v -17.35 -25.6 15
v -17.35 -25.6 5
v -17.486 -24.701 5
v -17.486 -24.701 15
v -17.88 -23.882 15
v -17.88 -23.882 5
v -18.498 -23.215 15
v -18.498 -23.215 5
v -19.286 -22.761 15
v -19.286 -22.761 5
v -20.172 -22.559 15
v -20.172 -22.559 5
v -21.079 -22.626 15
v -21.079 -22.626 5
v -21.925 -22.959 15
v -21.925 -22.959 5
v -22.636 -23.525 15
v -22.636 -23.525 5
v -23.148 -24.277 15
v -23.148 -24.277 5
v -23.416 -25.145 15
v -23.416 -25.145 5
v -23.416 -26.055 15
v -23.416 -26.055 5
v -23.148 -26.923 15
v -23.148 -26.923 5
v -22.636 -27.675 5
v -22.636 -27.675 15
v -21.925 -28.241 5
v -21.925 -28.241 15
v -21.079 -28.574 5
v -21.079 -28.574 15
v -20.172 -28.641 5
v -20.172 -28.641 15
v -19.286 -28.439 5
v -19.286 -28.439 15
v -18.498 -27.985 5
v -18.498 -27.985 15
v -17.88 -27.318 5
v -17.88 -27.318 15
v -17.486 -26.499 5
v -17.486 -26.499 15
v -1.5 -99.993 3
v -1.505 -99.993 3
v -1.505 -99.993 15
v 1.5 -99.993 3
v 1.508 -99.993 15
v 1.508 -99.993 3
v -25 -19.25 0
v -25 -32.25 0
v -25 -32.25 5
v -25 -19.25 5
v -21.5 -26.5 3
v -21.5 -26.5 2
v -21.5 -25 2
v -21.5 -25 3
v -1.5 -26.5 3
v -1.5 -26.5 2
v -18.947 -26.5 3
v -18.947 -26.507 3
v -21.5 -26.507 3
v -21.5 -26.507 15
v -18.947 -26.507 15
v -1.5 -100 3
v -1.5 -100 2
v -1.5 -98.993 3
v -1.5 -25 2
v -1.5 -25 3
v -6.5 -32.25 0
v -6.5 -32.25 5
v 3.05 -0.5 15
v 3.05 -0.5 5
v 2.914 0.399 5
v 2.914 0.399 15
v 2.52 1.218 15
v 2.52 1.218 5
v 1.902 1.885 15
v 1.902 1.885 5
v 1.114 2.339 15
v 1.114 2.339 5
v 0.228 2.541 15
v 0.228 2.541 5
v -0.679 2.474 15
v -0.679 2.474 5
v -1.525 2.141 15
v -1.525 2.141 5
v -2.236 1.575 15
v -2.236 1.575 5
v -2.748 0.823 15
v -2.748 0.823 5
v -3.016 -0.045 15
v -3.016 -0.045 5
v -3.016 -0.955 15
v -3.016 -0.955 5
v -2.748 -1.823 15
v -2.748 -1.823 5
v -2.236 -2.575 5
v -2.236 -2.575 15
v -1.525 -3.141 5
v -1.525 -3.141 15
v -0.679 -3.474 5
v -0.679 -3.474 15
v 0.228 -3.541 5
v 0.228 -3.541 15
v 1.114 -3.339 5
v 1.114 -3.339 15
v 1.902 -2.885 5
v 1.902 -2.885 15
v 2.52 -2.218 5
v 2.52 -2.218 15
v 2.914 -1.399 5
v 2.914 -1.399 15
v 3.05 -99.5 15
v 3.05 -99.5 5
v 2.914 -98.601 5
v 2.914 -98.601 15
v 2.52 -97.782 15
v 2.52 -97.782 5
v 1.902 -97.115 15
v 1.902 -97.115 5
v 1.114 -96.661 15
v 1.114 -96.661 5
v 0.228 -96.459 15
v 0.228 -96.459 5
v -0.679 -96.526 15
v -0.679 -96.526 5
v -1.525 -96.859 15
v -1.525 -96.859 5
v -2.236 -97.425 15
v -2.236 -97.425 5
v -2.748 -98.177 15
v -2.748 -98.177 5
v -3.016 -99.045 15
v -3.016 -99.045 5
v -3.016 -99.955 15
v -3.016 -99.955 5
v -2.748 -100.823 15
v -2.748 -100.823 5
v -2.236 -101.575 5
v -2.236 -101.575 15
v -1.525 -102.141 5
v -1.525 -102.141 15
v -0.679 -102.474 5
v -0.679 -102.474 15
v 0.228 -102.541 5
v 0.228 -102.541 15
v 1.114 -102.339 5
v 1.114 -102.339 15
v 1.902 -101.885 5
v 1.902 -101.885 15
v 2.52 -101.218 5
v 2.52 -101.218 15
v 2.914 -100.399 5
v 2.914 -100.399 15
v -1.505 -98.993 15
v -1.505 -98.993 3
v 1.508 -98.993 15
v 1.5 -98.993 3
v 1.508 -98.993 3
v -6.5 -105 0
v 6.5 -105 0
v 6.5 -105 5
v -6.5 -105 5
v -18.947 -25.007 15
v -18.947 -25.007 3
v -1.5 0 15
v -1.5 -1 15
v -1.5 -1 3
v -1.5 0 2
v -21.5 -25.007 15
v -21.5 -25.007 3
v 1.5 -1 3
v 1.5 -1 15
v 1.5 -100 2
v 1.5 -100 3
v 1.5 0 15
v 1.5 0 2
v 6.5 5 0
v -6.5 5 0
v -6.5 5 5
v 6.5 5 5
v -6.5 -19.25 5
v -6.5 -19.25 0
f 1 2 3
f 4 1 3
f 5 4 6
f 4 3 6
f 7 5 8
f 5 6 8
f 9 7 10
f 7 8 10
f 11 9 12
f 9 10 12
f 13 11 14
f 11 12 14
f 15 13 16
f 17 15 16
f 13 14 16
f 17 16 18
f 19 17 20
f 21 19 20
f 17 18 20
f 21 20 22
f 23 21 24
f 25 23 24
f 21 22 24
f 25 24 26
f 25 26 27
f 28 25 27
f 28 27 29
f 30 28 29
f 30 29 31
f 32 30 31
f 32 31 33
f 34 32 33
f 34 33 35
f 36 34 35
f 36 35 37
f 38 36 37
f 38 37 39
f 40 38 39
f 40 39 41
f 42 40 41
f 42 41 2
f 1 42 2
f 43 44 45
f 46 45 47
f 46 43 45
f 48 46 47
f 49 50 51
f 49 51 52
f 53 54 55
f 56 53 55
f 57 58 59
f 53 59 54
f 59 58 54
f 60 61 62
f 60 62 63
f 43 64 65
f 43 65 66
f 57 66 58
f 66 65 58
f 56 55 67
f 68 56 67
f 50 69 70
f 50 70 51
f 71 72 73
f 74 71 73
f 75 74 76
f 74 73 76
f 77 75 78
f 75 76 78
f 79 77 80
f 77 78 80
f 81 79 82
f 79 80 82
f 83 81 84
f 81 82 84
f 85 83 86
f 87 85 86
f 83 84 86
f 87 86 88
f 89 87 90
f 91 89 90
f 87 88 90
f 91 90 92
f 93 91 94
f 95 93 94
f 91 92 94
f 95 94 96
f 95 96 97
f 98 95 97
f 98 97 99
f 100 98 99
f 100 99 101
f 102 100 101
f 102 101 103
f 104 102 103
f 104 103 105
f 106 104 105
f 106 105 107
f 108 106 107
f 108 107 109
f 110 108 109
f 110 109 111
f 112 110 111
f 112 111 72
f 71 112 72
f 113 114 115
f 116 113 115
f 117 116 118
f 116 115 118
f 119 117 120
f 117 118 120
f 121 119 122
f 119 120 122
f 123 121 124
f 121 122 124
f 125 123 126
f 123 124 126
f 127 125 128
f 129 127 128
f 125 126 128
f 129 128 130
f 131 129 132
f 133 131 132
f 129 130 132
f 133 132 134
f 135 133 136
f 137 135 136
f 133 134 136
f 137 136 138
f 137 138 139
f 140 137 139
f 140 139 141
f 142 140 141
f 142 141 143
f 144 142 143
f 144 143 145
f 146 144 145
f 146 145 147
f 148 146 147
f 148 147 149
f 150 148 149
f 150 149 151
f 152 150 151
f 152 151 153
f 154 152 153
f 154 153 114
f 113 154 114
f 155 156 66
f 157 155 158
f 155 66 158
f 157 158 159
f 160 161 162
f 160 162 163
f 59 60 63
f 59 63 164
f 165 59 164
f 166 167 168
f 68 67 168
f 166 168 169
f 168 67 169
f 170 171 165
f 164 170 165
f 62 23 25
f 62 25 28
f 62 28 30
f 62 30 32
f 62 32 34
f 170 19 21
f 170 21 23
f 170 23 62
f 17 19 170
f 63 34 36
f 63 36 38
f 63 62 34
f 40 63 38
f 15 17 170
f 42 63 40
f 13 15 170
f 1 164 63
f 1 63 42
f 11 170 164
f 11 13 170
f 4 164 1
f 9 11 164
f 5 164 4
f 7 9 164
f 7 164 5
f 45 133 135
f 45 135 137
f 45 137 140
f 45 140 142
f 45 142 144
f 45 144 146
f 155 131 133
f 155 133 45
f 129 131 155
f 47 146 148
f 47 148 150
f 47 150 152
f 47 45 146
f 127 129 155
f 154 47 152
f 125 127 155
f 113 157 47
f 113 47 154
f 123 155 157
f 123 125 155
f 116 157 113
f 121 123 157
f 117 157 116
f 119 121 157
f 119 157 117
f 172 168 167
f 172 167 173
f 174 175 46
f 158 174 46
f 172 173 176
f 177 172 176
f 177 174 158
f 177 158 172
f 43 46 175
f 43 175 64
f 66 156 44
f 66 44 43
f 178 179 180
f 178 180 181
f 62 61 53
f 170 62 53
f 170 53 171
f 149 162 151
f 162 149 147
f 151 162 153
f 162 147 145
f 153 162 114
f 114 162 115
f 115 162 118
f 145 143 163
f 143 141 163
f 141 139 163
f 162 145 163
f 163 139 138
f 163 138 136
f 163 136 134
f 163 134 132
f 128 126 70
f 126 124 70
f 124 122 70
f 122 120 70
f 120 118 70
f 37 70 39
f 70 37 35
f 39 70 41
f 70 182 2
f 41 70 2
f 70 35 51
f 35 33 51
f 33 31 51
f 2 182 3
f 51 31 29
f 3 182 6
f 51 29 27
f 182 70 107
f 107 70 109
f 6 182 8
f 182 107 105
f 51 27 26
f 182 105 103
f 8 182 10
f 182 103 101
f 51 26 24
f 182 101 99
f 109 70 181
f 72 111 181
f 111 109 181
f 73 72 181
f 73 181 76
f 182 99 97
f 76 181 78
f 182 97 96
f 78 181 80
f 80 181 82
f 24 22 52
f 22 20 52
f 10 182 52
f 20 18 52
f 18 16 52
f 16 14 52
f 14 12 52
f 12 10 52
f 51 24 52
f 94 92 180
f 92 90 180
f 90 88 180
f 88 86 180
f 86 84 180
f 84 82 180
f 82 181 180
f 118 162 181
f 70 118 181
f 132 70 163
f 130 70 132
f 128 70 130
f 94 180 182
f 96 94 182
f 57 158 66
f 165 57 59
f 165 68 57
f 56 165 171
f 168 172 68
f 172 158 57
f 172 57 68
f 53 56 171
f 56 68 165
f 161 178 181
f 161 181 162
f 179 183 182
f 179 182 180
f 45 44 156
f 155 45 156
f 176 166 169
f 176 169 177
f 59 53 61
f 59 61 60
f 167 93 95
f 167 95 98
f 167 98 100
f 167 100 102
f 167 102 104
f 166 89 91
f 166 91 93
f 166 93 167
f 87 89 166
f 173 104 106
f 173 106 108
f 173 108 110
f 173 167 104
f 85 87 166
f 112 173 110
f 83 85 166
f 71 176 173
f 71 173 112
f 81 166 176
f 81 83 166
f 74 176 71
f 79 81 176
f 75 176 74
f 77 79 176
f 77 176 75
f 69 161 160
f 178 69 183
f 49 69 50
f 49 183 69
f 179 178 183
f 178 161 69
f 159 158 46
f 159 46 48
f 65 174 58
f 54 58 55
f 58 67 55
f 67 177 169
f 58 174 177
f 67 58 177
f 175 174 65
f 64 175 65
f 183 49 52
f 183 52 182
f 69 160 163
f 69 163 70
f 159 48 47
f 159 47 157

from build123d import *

# Parameters (mm, degrees)
PAD_DEPTH         = 1
SKETCH001_W       = 3
SKETCH001_H       = 1
SKETCH001_W_2     = 3.012331
SKETCH001_W_3     = 2.553459
SKETCH001_H_2     = 1.5
PAD001_DEPTH      = 20
CYLINDER_R        = 3.05
CYLINDER_DEPTH    = 15
CYLINDER002_R     = 3.05
CYLINDER002_DEPTH = 15
PAD002_DEPTH      = 5
CYLINDER001_R     = 3.05
CYLINDER001_DEPTH = 15


with BuildPart() as channels_with_connection:
    # Sketch → Pad (new body)
    with BuildSketch(Plane.XY.offset(2)):
        Polygon((-1.5, 0), (1.5, 0), (1.5, -100), (-1.5, -100), (-1.5, -26.5), (-21.5, -26.5), (-21.5, -25), (-1.5, -25), align=None)
    extrude(amount=PAD_DEPTH)

    # Sketch001 → Pad001 (new body)
    with BuildSketch(Plane.XY.offset(3)):
        with Locations((0, -0.5)):
            Rectangle(SKETCH001_W, SKETCH001_H)
        with Locations((0.001527, -99.493348)):
            Rectangle(SKETCH001_W_2, SKETCH001_H)
        with Locations((-20.22327, -25.757023)):
            Rectangle(SKETCH001_W_3, SKETCH001_H_2)
    extrude(amount=PAD001_DEPTH)


with BuildPart() as cylinder:
    # Cylinder → Cylinder (new body)
    with BuildSketch(Plane(origin=(0, -0.5, 0), x_dir=(1, 0, 0), z_dir=(0, 0, 1))):
        Circle(CYLINDER_R)
    extrude(amount=CYLINDER_DEPTH)


with BuildPart() as cylinder002:
    # Cylinder002 → Cylinder002 (new body)
    with BuildSketch(Plane(origin=(-20.4, -25.6, 0), x_dir=(1, 0, 0), z_dir=(0, 0, 1))):
        Circle(CYLINDER002_R)
    extrude(amount=CYLINDER002_DEPTH)


with BuildPart() as volume_medium:
    # Sketch002 → Pad002 (new body)
    with BuildSketch(Plane.XY):
        Polygon((-6.5, 5), (6.5, 5), (6.5, -105), (-6.5, -105), (-6.5, -32.25), (-25, -32.25), (-25, -19.25), (-6.5, -19.25), align=None)
    extrude(amount=PAD002_DEPTH)


with BuildPart() as t_junction:
    # Cylinder001 → Cylinder001 (new body)
    with BuildSketch(Plane(origin=(0, -99.5, 0), x_dir=(1, 0, 0), z_dir=(0, 0, 1))):
        Circle(CYLINDER001_R)
    extrude(amount=CYLINDER001_DEPTH)

    # Fusion: union Cylinder, Cylinder002, volume_medium
    add(cylinder.part)
    add(cylinder002.part)
    add(volume_medium.part)

    # Cut: cut channels_with_connection
    add(channels_with_connection.part, mode=Mode.SUBTRACT)


solid = t_junction.part
